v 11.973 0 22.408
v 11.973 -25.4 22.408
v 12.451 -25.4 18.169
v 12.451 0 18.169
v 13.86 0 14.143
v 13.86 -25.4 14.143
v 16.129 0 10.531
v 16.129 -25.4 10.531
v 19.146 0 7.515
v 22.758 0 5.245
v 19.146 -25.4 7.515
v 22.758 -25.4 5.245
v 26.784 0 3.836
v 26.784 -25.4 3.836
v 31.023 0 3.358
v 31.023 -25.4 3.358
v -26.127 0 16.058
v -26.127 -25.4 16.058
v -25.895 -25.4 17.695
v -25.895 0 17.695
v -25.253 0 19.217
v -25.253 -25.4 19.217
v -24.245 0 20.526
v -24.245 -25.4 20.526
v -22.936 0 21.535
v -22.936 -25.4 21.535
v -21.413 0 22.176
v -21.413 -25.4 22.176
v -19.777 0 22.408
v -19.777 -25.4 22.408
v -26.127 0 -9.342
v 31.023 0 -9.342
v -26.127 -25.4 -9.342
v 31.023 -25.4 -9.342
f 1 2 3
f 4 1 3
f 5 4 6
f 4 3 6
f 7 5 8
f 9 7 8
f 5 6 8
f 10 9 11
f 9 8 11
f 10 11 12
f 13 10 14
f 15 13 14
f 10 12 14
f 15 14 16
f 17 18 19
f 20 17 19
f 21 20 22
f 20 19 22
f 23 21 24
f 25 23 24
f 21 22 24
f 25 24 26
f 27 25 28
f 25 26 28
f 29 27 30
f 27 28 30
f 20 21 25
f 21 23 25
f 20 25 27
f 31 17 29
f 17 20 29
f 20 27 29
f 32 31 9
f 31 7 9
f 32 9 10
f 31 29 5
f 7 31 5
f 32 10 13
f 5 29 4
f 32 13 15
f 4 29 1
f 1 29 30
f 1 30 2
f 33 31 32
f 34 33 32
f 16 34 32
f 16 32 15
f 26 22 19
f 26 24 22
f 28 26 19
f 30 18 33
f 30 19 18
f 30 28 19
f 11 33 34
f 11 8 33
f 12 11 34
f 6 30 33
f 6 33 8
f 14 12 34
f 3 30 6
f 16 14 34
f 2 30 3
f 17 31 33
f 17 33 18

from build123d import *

# Parameters (mm, degrees)
F0_W     = 57.15
F0_H     = 31.75
F1_DEPTH = 25.4
F3_DEPTH = 25.4
F5_DEPTH = 25.4


with BuildPart() as f1:
    # F0 (on Front) → F1 (new body)
    with BuildSketch(Plane.XZ):
        with Locations((2.448356, 6.53348)):
            Rectangle(F0_W, F0_H)
    extrude(amount=F1_DEPTH)

    # F2 (on face) → F3 (cut)
    with BuildSketch(Plane.XZ.offset(25.4)):
        with BuildLine():
            Line((31.023356, 22.40848), (11.973356, 22.40848))
            ThreePointArc((11.973356, 22.40848), (17.552972, 8.938096), (31.023356, 3.35848))
            Line((31.023356, 3.35848), (31.023356, 22.40848))
        make_face()
    extrude(amount=-F3_DEPTH, mode=Mode.SUBTRACT)

    # F4 (on face) → F5 (cut)
    with BuildSketch(Plane.XZ.offset(25.4)):
        with BuildLine():
            ThreePointArc((-26.126644, 16.05848), (-24.244579, 20.526415), (-19.776644, 22.40848))
            Line((-19.776644, 22.40848), (-26.126644, 22.40848))
            Line((-26.126644, 22.40848), (-26.126644, 16.05848))
        make_face()
    extrude(amount=-F5_DEPTH, mode=Mode.SUBTRACT)


solid = f1.part
